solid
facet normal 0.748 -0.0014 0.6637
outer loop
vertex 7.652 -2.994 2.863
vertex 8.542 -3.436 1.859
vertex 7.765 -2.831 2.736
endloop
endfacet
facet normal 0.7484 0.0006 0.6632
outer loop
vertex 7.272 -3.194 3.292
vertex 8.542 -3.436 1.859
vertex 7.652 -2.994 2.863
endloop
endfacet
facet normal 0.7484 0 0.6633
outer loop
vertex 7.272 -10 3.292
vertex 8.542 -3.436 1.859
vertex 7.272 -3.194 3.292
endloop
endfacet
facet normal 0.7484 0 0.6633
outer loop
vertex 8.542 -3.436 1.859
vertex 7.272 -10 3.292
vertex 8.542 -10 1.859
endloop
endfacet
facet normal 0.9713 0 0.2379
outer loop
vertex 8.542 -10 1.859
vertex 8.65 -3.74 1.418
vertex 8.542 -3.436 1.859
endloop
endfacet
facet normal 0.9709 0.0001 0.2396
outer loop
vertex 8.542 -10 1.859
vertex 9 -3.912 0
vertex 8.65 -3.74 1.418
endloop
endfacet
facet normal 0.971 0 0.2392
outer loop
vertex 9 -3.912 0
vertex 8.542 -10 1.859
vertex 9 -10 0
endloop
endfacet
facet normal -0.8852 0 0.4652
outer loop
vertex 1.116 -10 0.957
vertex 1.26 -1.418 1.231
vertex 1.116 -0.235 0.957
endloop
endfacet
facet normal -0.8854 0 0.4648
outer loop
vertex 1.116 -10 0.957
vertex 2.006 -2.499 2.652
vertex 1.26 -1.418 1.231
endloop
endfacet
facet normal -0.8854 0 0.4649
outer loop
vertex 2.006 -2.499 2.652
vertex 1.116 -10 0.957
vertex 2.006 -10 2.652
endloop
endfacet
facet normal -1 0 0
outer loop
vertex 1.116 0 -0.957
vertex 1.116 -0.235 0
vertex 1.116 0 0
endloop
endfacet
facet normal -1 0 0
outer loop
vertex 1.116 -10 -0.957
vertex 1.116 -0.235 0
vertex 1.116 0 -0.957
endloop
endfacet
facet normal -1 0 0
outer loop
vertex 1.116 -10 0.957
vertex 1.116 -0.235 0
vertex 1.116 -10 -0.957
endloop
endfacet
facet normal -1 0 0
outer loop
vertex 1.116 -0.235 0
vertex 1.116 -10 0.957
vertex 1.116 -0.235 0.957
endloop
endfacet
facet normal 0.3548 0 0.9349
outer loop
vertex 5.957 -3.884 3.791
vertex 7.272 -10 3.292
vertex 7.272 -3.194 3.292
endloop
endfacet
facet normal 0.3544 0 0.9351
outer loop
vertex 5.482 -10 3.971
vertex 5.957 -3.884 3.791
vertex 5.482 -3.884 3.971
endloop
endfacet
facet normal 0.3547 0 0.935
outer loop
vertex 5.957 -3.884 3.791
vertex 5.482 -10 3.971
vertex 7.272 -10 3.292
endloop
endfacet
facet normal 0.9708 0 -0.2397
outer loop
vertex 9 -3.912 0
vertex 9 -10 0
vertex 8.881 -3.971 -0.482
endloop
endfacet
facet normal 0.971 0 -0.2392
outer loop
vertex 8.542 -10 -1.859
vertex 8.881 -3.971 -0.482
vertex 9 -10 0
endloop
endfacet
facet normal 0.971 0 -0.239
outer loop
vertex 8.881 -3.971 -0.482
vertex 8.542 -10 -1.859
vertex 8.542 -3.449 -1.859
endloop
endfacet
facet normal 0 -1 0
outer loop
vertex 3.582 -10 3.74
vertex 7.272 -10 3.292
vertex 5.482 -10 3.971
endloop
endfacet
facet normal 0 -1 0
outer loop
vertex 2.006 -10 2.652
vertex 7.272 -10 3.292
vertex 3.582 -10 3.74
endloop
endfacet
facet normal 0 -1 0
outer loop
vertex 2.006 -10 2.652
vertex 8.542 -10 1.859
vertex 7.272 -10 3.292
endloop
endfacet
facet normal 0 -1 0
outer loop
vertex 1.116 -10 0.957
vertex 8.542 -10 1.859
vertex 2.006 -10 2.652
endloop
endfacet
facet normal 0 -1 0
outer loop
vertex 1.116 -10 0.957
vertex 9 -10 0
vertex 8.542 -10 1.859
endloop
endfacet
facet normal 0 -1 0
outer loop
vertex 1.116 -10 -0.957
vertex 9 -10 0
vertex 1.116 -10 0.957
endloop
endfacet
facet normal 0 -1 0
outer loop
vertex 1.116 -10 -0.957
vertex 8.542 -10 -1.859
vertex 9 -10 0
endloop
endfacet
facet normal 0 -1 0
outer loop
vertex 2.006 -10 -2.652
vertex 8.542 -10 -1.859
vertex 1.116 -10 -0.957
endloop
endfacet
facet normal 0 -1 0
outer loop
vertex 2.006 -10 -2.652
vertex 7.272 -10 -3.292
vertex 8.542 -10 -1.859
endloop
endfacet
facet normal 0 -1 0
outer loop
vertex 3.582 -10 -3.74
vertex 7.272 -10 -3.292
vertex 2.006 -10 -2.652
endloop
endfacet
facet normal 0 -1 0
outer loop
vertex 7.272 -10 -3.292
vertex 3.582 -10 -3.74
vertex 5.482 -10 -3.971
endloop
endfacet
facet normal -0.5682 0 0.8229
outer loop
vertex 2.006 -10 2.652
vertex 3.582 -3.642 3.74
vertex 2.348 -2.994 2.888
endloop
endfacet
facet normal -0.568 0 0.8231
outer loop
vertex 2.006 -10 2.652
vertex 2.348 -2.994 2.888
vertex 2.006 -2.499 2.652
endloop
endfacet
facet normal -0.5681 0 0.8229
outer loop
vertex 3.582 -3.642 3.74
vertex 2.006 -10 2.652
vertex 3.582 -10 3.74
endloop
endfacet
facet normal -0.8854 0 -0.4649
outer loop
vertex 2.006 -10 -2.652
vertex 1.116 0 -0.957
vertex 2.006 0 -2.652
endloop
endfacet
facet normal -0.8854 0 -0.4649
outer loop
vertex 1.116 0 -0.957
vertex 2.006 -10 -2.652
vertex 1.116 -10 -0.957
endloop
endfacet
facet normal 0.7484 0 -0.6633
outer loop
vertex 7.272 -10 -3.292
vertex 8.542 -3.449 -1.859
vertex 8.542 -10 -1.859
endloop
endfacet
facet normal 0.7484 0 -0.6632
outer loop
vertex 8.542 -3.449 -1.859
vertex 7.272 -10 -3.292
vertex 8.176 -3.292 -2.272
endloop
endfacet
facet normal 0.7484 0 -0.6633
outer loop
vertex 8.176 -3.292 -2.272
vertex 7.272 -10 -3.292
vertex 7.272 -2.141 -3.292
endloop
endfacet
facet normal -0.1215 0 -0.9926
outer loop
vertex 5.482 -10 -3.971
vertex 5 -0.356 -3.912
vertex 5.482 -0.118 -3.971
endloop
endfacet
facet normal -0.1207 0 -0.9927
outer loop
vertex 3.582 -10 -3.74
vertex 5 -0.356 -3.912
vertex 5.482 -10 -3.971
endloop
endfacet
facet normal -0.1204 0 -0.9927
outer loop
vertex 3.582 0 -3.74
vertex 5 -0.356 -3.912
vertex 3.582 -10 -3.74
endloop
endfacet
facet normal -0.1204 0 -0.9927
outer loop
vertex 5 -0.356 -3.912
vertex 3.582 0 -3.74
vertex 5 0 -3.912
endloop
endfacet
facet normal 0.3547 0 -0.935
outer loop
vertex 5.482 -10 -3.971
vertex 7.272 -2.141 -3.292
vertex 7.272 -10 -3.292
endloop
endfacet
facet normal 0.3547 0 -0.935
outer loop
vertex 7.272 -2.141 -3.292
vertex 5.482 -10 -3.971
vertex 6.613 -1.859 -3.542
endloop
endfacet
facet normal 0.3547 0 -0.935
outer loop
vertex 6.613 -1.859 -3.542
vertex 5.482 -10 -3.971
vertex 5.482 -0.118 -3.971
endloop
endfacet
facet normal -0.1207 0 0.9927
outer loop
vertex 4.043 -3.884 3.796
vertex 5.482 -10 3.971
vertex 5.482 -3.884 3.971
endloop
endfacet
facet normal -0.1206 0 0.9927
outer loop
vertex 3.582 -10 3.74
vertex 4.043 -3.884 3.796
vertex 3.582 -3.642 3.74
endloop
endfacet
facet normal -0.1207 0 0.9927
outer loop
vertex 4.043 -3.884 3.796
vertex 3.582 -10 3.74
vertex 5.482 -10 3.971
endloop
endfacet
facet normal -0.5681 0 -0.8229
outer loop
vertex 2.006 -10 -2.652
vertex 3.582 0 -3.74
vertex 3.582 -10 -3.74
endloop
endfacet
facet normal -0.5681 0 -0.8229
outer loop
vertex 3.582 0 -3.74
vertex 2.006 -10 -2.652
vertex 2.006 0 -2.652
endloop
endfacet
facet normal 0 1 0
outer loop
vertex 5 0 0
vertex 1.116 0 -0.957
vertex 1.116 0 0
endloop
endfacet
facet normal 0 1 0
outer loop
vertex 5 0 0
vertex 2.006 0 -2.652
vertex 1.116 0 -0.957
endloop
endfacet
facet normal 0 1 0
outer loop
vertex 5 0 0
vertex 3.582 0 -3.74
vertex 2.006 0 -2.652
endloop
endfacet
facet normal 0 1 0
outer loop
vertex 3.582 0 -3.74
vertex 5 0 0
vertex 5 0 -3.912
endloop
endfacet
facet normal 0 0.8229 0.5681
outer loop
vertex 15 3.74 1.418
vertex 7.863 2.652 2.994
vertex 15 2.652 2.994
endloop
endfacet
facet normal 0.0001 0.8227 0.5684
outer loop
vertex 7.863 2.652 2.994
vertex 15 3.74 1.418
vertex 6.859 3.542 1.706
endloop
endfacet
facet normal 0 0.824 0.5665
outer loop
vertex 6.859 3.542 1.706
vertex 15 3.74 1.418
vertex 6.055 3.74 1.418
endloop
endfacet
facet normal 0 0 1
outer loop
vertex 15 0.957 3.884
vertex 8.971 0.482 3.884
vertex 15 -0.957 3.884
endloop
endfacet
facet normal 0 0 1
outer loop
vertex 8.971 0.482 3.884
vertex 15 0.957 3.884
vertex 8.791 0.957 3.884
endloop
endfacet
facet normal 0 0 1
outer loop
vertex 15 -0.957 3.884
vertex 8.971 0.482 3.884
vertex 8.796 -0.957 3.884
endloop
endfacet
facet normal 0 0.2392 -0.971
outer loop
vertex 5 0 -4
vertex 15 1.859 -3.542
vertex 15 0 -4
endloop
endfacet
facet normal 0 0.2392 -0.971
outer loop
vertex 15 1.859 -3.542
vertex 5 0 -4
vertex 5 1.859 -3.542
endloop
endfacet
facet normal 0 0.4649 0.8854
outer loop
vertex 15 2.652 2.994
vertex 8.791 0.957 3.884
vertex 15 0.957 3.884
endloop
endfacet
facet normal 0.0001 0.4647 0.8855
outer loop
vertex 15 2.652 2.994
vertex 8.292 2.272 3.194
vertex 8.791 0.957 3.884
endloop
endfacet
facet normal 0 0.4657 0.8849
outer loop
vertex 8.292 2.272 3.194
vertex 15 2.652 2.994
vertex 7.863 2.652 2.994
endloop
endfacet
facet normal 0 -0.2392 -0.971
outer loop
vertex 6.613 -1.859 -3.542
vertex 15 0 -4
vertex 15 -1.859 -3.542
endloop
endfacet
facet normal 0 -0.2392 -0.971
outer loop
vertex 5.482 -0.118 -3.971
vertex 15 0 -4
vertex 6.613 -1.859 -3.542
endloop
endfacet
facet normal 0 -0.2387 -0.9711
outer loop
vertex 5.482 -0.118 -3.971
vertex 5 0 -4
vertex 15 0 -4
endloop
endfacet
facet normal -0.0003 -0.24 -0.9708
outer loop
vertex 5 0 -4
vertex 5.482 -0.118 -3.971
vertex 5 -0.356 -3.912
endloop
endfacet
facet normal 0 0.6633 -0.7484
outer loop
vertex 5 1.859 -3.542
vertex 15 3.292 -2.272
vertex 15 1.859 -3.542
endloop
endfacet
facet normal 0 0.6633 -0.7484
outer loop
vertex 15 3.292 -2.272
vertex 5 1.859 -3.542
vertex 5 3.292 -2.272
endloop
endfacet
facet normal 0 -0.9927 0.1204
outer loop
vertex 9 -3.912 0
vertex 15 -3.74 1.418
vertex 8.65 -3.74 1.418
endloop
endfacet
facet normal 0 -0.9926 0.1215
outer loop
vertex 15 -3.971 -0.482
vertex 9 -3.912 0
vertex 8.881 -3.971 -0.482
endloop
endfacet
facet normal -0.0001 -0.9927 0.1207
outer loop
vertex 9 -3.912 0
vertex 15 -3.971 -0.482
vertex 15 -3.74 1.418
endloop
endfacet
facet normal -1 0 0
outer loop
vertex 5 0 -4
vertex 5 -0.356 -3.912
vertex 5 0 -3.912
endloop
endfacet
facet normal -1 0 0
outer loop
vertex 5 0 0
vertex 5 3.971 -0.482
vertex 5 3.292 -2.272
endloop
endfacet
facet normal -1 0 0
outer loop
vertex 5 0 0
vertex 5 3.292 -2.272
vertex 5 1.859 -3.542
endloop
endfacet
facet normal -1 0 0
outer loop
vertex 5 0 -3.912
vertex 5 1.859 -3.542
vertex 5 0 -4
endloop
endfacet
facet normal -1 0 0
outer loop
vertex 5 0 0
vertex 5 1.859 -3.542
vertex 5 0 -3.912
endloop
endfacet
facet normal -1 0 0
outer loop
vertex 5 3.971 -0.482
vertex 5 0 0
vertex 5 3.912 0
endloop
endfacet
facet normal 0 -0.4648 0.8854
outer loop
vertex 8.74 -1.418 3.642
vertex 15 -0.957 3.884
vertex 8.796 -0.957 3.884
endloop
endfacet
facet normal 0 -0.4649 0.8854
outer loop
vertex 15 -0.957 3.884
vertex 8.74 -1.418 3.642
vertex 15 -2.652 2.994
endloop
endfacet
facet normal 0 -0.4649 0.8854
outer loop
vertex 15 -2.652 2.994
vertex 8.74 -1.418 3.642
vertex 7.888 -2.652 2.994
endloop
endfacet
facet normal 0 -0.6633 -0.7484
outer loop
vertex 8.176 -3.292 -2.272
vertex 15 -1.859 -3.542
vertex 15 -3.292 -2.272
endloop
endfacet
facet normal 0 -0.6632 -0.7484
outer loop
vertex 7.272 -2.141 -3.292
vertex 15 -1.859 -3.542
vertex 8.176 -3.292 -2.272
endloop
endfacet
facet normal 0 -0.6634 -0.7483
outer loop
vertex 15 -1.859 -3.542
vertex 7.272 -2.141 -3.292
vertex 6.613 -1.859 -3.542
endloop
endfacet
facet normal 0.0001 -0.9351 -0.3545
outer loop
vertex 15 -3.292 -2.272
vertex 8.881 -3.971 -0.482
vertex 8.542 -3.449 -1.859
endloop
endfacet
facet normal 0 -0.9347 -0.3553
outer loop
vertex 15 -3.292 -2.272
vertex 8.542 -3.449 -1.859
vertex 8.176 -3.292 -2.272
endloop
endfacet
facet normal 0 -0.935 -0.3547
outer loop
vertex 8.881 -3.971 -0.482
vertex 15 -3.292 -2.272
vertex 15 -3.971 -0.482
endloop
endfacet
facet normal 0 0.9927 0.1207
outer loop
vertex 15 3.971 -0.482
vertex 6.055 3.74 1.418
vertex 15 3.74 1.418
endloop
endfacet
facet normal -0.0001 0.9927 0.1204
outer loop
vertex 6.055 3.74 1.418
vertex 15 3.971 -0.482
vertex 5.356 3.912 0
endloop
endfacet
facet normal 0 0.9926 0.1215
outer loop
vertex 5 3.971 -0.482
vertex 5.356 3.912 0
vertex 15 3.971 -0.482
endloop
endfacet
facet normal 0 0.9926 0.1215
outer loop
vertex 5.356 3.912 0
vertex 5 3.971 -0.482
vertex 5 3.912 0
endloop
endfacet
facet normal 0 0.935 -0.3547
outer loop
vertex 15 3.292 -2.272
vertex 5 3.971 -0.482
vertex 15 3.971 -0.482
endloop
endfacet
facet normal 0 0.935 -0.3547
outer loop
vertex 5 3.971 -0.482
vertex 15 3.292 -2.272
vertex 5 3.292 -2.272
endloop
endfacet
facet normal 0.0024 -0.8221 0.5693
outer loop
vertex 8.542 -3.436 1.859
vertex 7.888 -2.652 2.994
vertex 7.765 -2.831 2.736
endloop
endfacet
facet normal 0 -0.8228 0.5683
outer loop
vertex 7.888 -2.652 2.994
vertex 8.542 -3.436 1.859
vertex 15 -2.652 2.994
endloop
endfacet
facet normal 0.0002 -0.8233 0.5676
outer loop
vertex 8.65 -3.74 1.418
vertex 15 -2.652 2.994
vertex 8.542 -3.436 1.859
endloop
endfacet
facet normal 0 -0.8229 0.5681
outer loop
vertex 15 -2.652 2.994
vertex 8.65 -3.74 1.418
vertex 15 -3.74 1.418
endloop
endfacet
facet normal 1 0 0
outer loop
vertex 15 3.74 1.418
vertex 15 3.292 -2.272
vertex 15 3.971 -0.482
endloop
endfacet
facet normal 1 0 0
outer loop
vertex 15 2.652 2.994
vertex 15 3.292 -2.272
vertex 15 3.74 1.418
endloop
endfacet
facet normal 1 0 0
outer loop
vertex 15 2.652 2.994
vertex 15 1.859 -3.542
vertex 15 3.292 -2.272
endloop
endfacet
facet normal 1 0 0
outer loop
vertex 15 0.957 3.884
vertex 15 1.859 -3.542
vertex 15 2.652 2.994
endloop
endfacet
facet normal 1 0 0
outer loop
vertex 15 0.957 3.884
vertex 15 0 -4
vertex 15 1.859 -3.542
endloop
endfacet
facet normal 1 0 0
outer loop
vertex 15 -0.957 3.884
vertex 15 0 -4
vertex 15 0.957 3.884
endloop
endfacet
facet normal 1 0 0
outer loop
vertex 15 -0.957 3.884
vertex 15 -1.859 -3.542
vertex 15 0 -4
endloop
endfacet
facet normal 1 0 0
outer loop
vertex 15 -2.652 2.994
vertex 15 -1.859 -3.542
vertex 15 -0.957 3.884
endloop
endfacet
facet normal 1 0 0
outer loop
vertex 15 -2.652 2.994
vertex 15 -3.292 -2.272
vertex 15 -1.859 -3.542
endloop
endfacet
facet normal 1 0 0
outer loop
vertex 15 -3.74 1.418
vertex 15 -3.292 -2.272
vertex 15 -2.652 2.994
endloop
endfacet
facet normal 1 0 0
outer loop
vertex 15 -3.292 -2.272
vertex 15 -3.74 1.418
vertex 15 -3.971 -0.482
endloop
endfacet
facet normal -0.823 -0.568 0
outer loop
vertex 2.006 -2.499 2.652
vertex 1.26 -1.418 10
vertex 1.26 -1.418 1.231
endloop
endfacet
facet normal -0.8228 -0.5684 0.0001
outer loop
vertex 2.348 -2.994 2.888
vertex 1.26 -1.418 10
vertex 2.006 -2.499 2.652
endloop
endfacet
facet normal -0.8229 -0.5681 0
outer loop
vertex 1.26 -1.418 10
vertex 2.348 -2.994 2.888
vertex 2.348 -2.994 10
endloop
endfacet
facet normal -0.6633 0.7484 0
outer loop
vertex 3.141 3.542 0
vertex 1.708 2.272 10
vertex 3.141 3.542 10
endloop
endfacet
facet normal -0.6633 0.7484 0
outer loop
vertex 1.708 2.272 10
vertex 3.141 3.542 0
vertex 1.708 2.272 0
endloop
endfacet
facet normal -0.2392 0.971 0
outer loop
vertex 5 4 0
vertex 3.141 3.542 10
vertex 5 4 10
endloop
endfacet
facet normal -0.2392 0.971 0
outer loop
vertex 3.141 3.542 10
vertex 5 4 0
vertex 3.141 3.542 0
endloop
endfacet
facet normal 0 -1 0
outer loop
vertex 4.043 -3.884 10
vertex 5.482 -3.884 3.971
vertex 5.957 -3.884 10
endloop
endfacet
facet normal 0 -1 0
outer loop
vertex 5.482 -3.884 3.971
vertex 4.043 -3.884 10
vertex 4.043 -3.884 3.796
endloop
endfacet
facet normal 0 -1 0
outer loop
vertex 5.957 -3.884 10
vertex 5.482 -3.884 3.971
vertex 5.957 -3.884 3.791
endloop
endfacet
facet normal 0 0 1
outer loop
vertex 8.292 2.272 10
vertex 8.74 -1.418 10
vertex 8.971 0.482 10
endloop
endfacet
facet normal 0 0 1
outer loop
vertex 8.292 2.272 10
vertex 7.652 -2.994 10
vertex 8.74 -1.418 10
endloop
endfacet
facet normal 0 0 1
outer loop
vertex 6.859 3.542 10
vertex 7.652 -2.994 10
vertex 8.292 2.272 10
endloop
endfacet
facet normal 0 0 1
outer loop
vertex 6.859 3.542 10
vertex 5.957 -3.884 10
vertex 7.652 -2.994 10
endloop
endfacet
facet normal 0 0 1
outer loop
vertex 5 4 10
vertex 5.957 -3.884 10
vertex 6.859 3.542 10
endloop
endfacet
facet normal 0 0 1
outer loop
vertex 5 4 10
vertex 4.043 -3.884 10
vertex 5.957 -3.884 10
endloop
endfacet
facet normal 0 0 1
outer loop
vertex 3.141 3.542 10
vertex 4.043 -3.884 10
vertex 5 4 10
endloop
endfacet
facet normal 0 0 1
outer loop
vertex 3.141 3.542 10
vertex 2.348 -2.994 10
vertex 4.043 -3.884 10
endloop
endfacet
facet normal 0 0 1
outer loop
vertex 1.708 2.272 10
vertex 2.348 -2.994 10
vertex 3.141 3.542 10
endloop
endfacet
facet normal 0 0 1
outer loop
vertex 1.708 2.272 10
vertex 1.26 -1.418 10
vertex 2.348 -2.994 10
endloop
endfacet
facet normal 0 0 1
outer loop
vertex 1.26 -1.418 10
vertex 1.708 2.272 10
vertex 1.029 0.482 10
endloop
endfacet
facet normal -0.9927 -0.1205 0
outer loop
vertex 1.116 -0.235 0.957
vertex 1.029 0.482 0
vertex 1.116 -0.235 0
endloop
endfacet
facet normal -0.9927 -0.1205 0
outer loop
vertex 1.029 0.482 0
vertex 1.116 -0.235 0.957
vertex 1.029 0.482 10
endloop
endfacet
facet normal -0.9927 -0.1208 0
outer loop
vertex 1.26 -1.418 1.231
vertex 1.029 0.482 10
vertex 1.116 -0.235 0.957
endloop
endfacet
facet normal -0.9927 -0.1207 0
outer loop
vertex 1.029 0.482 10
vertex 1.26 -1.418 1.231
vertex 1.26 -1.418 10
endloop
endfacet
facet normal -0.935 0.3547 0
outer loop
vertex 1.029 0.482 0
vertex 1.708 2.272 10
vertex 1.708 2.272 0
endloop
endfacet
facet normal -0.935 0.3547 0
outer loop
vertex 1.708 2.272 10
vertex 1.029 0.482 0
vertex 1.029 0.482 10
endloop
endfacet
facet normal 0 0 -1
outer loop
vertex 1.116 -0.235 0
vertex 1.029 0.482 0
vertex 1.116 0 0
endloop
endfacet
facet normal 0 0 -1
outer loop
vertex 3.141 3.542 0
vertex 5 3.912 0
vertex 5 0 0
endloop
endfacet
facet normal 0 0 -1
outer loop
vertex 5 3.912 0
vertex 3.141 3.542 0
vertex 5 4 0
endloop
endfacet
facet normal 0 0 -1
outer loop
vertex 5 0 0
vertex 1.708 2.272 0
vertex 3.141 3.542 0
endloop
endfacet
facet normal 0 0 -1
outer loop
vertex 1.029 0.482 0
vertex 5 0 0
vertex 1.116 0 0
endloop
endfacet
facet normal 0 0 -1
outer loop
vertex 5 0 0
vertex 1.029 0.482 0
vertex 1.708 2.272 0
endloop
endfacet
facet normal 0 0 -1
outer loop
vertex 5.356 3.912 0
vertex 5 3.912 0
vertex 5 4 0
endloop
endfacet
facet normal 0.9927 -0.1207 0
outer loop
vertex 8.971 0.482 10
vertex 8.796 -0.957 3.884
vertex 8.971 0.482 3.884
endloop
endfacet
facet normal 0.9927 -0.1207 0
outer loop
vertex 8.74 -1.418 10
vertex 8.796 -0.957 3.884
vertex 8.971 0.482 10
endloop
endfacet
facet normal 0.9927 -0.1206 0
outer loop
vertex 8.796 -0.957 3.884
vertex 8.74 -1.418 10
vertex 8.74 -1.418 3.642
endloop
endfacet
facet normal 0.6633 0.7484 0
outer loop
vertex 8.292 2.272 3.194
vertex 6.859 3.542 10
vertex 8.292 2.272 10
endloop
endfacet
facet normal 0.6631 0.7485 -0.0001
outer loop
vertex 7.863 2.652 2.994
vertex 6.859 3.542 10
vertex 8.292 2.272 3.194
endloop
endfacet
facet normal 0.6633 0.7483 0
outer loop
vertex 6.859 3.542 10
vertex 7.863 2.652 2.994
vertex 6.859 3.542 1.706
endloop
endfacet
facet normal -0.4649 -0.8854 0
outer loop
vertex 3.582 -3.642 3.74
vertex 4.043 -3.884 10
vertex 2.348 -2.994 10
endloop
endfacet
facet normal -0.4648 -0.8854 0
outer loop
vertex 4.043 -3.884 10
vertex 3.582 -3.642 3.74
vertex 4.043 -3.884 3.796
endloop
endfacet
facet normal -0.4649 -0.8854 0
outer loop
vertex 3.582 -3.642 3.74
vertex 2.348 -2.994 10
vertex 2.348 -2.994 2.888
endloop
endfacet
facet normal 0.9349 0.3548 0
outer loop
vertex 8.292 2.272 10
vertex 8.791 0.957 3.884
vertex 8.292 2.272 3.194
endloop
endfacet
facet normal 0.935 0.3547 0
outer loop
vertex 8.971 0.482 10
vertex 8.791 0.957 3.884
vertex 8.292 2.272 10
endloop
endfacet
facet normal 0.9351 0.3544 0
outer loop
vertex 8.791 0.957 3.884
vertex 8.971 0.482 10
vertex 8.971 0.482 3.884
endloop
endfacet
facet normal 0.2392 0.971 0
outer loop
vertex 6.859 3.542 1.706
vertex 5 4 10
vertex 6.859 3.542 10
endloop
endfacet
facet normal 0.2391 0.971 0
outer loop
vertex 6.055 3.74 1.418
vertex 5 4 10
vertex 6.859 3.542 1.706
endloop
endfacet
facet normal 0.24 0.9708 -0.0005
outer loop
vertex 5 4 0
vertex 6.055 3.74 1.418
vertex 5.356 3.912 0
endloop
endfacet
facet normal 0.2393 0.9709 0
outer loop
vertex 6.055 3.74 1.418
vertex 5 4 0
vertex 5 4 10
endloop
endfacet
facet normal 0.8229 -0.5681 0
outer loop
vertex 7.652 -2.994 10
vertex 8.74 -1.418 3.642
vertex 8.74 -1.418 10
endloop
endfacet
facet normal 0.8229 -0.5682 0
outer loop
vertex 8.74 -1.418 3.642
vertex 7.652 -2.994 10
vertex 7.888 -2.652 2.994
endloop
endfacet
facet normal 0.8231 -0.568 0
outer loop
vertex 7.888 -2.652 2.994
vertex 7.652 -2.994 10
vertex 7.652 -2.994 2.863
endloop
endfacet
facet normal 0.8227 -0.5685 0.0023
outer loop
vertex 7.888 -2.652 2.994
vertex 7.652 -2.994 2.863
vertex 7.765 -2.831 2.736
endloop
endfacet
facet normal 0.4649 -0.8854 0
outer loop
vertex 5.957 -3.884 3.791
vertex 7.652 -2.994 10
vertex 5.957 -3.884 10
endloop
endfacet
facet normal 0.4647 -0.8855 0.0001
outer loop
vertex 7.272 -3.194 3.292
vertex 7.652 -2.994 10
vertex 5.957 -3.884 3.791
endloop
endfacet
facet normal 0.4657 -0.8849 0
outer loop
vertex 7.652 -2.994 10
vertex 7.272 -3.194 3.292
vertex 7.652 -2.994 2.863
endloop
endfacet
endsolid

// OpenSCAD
translate([5, 0, 0]) rotate([90, 0, 0]) cylinder(h=10, r=4);
translate([5, 0, 0]) rotate([0, 90, 0]) cylinder(h=10, r=4);
translate([5, 0, 0]) rotate([0, 0, 90]) cylinder(h=10, r=4);
